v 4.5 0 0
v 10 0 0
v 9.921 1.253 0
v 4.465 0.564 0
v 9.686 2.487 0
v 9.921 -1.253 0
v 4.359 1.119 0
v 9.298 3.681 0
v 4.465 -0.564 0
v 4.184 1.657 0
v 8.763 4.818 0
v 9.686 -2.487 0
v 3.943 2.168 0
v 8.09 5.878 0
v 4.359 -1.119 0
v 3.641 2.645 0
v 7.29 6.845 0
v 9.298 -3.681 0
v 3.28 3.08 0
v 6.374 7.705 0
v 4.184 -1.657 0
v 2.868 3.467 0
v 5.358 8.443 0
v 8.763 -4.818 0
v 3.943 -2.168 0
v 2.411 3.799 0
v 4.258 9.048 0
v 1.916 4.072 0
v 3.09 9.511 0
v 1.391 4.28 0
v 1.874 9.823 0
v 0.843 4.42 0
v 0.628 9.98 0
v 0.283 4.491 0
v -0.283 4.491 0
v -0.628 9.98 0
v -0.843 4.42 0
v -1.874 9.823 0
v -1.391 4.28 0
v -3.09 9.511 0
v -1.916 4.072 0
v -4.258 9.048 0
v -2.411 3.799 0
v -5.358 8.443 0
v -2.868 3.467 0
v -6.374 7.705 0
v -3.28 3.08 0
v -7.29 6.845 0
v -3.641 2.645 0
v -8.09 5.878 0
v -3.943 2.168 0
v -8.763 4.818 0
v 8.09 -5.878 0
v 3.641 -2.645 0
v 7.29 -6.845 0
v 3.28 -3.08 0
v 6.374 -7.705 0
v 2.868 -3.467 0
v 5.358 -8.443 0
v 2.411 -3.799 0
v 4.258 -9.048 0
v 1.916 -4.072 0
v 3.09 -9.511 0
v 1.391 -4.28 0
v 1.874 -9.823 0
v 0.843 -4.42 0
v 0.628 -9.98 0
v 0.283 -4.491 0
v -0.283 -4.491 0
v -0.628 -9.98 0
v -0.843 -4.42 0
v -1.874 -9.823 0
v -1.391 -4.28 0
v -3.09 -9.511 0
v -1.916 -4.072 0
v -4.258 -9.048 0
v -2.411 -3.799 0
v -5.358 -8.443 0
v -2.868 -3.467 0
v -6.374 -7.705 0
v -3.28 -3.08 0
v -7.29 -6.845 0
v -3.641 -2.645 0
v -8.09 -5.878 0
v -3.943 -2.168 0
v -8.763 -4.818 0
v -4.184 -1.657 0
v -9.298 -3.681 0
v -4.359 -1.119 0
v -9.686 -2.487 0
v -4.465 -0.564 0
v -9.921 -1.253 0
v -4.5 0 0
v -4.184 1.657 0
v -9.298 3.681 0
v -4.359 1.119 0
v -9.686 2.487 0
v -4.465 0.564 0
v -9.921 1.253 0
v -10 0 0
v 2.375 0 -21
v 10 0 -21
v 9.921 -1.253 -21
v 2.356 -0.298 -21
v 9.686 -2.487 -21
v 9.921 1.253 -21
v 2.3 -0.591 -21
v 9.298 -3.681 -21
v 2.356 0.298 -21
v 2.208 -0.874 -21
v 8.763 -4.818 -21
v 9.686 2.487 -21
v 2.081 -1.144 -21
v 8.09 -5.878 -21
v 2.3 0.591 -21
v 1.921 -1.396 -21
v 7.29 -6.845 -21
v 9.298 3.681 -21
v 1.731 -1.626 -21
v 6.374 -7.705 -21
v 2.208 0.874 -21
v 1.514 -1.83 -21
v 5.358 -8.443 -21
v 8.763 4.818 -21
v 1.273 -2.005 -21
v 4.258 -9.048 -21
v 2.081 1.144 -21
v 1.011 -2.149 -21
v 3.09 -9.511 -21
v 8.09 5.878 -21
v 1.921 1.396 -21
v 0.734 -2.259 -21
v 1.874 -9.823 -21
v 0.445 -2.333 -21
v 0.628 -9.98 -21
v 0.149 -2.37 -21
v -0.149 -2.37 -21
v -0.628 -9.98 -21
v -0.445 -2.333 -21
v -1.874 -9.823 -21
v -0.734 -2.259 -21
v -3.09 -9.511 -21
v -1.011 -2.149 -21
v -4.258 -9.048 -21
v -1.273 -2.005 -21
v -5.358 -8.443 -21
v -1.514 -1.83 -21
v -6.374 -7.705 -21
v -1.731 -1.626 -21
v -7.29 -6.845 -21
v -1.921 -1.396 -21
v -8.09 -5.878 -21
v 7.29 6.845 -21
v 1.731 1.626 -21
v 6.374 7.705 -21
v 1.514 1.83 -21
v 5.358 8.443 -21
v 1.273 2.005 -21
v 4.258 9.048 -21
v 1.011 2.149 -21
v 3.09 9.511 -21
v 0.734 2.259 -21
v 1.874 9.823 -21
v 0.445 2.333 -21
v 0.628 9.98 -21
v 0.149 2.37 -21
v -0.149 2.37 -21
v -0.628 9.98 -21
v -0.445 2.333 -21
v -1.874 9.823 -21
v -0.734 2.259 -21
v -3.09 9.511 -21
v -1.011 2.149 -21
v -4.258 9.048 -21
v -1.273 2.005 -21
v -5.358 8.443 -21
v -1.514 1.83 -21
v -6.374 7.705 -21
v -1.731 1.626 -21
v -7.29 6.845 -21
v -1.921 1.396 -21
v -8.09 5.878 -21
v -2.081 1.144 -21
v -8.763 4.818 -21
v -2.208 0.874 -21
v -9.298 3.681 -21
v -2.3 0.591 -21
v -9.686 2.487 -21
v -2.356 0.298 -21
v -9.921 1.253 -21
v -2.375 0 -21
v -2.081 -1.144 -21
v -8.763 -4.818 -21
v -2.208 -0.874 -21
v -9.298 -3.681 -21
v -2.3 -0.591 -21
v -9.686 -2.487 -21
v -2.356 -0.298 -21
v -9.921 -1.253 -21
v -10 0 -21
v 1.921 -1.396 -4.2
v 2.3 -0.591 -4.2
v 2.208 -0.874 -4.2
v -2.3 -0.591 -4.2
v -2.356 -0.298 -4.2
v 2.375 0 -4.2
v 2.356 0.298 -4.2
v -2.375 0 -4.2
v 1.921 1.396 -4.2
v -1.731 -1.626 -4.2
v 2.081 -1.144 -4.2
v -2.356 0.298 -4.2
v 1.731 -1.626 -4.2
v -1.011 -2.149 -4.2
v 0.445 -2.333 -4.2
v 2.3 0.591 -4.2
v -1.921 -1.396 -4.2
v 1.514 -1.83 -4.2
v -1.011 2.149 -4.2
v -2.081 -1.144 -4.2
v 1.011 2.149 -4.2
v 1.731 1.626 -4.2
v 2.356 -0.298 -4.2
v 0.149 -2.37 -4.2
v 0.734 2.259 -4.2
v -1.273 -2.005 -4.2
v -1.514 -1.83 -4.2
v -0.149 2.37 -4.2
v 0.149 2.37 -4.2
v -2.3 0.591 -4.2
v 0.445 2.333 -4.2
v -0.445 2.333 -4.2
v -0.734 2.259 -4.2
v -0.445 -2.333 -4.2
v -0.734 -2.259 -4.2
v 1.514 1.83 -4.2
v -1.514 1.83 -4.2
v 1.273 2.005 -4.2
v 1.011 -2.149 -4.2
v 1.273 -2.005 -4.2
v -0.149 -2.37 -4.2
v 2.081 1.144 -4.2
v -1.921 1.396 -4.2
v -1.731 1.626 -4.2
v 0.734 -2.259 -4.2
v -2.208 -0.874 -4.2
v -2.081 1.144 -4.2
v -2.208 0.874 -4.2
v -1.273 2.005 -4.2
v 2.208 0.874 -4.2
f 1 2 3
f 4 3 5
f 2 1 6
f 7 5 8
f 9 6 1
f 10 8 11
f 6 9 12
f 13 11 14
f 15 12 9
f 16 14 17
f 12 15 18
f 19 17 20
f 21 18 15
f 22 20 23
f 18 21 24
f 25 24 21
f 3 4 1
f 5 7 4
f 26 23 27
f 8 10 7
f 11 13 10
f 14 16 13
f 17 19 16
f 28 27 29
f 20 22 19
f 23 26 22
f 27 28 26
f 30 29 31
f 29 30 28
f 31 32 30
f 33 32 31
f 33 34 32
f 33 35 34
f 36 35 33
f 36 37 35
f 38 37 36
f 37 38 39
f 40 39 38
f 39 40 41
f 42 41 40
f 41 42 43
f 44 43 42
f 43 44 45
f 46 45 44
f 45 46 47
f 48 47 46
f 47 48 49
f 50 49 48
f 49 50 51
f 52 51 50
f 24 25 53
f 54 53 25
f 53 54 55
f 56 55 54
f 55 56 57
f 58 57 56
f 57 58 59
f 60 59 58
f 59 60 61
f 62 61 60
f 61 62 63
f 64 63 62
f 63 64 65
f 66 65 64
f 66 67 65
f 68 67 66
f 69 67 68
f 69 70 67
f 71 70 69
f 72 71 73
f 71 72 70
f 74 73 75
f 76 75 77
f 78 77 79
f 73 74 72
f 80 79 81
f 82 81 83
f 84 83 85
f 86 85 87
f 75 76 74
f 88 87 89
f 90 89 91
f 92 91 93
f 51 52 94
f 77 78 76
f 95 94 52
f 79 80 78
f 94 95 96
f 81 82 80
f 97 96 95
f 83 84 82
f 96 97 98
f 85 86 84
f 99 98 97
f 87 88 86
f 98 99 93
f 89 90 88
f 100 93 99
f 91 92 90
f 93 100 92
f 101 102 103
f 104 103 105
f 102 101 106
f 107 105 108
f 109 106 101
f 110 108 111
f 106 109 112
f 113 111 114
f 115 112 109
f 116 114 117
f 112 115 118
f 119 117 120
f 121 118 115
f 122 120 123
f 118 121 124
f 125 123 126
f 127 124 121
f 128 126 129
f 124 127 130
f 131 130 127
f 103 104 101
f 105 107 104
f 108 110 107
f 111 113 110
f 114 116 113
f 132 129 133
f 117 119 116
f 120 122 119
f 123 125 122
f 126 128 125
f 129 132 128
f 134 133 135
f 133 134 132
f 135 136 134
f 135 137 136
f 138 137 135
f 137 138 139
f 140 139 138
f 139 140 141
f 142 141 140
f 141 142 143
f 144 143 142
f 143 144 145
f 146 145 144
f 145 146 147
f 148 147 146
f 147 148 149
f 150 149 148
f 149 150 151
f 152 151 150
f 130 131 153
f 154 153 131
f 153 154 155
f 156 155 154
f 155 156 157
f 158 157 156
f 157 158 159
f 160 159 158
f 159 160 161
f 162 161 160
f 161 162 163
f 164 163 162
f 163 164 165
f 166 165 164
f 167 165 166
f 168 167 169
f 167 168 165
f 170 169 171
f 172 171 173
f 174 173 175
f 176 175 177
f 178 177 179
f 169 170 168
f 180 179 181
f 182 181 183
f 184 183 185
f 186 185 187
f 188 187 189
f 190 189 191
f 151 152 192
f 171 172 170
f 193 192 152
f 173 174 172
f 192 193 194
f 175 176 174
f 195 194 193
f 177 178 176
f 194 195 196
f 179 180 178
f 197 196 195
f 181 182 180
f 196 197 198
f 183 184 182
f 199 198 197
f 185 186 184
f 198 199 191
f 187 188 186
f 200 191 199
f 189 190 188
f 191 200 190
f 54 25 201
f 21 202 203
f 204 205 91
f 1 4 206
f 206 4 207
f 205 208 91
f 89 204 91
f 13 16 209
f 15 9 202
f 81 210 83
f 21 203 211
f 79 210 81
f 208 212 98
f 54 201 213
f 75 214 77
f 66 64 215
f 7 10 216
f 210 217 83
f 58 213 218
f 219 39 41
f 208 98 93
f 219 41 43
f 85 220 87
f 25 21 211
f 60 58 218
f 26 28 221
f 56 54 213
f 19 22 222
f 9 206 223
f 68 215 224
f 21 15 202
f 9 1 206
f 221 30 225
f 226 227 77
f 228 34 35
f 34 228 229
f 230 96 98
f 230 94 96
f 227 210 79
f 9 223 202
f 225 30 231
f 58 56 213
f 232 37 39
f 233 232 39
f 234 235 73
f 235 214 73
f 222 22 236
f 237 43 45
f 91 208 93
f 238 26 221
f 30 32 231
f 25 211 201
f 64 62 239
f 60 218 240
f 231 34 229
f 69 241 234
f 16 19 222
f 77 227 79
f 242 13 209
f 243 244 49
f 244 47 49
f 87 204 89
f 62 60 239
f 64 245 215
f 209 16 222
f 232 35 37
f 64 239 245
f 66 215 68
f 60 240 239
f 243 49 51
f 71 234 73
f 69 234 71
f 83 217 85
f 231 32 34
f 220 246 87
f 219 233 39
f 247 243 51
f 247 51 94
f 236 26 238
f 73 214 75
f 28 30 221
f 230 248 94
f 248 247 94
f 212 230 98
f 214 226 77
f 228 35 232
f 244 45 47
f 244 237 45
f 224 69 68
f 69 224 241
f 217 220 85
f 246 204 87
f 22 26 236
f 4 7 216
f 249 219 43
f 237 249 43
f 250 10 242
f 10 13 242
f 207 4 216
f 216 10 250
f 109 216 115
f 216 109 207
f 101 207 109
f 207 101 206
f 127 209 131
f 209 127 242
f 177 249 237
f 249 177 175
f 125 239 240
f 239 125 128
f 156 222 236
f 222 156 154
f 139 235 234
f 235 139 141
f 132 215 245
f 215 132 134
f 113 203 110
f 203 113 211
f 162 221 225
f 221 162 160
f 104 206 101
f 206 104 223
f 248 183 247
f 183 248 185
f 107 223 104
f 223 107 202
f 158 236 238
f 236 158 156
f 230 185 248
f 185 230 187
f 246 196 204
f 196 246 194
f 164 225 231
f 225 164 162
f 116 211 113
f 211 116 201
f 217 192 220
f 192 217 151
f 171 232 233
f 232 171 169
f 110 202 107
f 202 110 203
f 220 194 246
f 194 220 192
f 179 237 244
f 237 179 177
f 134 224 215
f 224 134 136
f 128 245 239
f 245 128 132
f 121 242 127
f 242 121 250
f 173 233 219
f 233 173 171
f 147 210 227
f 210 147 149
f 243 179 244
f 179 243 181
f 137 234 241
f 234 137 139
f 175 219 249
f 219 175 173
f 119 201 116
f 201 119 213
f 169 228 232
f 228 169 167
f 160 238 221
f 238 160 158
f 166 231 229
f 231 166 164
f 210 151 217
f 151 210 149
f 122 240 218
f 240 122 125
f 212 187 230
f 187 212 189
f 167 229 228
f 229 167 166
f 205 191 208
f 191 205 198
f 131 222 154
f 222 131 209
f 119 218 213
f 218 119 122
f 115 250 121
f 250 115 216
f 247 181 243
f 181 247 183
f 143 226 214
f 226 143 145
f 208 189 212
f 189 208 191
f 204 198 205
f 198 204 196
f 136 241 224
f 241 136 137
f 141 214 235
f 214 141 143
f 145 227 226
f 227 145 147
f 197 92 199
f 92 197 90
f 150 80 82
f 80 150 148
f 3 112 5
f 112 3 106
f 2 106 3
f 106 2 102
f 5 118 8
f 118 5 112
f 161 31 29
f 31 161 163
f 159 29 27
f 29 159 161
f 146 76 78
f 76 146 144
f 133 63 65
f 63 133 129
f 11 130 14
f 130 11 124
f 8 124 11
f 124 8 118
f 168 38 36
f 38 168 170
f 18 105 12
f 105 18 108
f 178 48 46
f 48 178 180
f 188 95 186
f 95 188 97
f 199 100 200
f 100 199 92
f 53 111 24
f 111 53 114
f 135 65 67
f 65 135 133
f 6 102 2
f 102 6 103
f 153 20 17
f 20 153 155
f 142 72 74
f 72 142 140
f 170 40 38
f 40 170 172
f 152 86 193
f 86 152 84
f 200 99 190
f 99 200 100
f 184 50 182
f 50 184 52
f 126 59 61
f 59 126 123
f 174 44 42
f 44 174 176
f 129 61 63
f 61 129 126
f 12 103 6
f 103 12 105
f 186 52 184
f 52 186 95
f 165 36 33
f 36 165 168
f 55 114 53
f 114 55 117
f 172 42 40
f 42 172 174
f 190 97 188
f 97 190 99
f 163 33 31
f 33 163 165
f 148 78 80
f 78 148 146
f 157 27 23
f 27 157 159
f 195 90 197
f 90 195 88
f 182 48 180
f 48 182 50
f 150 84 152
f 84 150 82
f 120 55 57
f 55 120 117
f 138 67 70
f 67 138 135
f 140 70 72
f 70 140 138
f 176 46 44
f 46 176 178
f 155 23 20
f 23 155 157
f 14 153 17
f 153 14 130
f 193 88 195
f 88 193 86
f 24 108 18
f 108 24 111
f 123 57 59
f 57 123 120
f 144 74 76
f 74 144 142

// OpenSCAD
$fn = 50;


difference() {
	union() {
		translate(v = [0, 0, -21.0000000000]) {
			cylinder(h = 21, r = 10.0000000000);
		}
		cylinder(h = 0, r = 20.0000000000);
	}
	union() {
		translate(v = [0, 0, 0]) {
			rotate(a = [0, 0, 0]) {
				difference() {
					union() {
						#translate(v = [0, 0, -21.0000000000]) {
							cylinder(h = 21, r = 2.2500000000);
						}
						#translate(v = [0, 0, -4.2000000000]) {
							cylinder(h = 4.2000000000, r1 = 2.3750000000, r2 = 4.5000000000);
						}
						#translate(v = [0, 0, -21.0000000000]) {
							cylinder(h = 21, r = 2.3750000000);
						}
						#translate(v = [0, 0, -21.0000000000]) {
							cylinder(h = 21, r = 2.2500000000);
						}
					}
					union();
				}
			}
		}
	}
}
